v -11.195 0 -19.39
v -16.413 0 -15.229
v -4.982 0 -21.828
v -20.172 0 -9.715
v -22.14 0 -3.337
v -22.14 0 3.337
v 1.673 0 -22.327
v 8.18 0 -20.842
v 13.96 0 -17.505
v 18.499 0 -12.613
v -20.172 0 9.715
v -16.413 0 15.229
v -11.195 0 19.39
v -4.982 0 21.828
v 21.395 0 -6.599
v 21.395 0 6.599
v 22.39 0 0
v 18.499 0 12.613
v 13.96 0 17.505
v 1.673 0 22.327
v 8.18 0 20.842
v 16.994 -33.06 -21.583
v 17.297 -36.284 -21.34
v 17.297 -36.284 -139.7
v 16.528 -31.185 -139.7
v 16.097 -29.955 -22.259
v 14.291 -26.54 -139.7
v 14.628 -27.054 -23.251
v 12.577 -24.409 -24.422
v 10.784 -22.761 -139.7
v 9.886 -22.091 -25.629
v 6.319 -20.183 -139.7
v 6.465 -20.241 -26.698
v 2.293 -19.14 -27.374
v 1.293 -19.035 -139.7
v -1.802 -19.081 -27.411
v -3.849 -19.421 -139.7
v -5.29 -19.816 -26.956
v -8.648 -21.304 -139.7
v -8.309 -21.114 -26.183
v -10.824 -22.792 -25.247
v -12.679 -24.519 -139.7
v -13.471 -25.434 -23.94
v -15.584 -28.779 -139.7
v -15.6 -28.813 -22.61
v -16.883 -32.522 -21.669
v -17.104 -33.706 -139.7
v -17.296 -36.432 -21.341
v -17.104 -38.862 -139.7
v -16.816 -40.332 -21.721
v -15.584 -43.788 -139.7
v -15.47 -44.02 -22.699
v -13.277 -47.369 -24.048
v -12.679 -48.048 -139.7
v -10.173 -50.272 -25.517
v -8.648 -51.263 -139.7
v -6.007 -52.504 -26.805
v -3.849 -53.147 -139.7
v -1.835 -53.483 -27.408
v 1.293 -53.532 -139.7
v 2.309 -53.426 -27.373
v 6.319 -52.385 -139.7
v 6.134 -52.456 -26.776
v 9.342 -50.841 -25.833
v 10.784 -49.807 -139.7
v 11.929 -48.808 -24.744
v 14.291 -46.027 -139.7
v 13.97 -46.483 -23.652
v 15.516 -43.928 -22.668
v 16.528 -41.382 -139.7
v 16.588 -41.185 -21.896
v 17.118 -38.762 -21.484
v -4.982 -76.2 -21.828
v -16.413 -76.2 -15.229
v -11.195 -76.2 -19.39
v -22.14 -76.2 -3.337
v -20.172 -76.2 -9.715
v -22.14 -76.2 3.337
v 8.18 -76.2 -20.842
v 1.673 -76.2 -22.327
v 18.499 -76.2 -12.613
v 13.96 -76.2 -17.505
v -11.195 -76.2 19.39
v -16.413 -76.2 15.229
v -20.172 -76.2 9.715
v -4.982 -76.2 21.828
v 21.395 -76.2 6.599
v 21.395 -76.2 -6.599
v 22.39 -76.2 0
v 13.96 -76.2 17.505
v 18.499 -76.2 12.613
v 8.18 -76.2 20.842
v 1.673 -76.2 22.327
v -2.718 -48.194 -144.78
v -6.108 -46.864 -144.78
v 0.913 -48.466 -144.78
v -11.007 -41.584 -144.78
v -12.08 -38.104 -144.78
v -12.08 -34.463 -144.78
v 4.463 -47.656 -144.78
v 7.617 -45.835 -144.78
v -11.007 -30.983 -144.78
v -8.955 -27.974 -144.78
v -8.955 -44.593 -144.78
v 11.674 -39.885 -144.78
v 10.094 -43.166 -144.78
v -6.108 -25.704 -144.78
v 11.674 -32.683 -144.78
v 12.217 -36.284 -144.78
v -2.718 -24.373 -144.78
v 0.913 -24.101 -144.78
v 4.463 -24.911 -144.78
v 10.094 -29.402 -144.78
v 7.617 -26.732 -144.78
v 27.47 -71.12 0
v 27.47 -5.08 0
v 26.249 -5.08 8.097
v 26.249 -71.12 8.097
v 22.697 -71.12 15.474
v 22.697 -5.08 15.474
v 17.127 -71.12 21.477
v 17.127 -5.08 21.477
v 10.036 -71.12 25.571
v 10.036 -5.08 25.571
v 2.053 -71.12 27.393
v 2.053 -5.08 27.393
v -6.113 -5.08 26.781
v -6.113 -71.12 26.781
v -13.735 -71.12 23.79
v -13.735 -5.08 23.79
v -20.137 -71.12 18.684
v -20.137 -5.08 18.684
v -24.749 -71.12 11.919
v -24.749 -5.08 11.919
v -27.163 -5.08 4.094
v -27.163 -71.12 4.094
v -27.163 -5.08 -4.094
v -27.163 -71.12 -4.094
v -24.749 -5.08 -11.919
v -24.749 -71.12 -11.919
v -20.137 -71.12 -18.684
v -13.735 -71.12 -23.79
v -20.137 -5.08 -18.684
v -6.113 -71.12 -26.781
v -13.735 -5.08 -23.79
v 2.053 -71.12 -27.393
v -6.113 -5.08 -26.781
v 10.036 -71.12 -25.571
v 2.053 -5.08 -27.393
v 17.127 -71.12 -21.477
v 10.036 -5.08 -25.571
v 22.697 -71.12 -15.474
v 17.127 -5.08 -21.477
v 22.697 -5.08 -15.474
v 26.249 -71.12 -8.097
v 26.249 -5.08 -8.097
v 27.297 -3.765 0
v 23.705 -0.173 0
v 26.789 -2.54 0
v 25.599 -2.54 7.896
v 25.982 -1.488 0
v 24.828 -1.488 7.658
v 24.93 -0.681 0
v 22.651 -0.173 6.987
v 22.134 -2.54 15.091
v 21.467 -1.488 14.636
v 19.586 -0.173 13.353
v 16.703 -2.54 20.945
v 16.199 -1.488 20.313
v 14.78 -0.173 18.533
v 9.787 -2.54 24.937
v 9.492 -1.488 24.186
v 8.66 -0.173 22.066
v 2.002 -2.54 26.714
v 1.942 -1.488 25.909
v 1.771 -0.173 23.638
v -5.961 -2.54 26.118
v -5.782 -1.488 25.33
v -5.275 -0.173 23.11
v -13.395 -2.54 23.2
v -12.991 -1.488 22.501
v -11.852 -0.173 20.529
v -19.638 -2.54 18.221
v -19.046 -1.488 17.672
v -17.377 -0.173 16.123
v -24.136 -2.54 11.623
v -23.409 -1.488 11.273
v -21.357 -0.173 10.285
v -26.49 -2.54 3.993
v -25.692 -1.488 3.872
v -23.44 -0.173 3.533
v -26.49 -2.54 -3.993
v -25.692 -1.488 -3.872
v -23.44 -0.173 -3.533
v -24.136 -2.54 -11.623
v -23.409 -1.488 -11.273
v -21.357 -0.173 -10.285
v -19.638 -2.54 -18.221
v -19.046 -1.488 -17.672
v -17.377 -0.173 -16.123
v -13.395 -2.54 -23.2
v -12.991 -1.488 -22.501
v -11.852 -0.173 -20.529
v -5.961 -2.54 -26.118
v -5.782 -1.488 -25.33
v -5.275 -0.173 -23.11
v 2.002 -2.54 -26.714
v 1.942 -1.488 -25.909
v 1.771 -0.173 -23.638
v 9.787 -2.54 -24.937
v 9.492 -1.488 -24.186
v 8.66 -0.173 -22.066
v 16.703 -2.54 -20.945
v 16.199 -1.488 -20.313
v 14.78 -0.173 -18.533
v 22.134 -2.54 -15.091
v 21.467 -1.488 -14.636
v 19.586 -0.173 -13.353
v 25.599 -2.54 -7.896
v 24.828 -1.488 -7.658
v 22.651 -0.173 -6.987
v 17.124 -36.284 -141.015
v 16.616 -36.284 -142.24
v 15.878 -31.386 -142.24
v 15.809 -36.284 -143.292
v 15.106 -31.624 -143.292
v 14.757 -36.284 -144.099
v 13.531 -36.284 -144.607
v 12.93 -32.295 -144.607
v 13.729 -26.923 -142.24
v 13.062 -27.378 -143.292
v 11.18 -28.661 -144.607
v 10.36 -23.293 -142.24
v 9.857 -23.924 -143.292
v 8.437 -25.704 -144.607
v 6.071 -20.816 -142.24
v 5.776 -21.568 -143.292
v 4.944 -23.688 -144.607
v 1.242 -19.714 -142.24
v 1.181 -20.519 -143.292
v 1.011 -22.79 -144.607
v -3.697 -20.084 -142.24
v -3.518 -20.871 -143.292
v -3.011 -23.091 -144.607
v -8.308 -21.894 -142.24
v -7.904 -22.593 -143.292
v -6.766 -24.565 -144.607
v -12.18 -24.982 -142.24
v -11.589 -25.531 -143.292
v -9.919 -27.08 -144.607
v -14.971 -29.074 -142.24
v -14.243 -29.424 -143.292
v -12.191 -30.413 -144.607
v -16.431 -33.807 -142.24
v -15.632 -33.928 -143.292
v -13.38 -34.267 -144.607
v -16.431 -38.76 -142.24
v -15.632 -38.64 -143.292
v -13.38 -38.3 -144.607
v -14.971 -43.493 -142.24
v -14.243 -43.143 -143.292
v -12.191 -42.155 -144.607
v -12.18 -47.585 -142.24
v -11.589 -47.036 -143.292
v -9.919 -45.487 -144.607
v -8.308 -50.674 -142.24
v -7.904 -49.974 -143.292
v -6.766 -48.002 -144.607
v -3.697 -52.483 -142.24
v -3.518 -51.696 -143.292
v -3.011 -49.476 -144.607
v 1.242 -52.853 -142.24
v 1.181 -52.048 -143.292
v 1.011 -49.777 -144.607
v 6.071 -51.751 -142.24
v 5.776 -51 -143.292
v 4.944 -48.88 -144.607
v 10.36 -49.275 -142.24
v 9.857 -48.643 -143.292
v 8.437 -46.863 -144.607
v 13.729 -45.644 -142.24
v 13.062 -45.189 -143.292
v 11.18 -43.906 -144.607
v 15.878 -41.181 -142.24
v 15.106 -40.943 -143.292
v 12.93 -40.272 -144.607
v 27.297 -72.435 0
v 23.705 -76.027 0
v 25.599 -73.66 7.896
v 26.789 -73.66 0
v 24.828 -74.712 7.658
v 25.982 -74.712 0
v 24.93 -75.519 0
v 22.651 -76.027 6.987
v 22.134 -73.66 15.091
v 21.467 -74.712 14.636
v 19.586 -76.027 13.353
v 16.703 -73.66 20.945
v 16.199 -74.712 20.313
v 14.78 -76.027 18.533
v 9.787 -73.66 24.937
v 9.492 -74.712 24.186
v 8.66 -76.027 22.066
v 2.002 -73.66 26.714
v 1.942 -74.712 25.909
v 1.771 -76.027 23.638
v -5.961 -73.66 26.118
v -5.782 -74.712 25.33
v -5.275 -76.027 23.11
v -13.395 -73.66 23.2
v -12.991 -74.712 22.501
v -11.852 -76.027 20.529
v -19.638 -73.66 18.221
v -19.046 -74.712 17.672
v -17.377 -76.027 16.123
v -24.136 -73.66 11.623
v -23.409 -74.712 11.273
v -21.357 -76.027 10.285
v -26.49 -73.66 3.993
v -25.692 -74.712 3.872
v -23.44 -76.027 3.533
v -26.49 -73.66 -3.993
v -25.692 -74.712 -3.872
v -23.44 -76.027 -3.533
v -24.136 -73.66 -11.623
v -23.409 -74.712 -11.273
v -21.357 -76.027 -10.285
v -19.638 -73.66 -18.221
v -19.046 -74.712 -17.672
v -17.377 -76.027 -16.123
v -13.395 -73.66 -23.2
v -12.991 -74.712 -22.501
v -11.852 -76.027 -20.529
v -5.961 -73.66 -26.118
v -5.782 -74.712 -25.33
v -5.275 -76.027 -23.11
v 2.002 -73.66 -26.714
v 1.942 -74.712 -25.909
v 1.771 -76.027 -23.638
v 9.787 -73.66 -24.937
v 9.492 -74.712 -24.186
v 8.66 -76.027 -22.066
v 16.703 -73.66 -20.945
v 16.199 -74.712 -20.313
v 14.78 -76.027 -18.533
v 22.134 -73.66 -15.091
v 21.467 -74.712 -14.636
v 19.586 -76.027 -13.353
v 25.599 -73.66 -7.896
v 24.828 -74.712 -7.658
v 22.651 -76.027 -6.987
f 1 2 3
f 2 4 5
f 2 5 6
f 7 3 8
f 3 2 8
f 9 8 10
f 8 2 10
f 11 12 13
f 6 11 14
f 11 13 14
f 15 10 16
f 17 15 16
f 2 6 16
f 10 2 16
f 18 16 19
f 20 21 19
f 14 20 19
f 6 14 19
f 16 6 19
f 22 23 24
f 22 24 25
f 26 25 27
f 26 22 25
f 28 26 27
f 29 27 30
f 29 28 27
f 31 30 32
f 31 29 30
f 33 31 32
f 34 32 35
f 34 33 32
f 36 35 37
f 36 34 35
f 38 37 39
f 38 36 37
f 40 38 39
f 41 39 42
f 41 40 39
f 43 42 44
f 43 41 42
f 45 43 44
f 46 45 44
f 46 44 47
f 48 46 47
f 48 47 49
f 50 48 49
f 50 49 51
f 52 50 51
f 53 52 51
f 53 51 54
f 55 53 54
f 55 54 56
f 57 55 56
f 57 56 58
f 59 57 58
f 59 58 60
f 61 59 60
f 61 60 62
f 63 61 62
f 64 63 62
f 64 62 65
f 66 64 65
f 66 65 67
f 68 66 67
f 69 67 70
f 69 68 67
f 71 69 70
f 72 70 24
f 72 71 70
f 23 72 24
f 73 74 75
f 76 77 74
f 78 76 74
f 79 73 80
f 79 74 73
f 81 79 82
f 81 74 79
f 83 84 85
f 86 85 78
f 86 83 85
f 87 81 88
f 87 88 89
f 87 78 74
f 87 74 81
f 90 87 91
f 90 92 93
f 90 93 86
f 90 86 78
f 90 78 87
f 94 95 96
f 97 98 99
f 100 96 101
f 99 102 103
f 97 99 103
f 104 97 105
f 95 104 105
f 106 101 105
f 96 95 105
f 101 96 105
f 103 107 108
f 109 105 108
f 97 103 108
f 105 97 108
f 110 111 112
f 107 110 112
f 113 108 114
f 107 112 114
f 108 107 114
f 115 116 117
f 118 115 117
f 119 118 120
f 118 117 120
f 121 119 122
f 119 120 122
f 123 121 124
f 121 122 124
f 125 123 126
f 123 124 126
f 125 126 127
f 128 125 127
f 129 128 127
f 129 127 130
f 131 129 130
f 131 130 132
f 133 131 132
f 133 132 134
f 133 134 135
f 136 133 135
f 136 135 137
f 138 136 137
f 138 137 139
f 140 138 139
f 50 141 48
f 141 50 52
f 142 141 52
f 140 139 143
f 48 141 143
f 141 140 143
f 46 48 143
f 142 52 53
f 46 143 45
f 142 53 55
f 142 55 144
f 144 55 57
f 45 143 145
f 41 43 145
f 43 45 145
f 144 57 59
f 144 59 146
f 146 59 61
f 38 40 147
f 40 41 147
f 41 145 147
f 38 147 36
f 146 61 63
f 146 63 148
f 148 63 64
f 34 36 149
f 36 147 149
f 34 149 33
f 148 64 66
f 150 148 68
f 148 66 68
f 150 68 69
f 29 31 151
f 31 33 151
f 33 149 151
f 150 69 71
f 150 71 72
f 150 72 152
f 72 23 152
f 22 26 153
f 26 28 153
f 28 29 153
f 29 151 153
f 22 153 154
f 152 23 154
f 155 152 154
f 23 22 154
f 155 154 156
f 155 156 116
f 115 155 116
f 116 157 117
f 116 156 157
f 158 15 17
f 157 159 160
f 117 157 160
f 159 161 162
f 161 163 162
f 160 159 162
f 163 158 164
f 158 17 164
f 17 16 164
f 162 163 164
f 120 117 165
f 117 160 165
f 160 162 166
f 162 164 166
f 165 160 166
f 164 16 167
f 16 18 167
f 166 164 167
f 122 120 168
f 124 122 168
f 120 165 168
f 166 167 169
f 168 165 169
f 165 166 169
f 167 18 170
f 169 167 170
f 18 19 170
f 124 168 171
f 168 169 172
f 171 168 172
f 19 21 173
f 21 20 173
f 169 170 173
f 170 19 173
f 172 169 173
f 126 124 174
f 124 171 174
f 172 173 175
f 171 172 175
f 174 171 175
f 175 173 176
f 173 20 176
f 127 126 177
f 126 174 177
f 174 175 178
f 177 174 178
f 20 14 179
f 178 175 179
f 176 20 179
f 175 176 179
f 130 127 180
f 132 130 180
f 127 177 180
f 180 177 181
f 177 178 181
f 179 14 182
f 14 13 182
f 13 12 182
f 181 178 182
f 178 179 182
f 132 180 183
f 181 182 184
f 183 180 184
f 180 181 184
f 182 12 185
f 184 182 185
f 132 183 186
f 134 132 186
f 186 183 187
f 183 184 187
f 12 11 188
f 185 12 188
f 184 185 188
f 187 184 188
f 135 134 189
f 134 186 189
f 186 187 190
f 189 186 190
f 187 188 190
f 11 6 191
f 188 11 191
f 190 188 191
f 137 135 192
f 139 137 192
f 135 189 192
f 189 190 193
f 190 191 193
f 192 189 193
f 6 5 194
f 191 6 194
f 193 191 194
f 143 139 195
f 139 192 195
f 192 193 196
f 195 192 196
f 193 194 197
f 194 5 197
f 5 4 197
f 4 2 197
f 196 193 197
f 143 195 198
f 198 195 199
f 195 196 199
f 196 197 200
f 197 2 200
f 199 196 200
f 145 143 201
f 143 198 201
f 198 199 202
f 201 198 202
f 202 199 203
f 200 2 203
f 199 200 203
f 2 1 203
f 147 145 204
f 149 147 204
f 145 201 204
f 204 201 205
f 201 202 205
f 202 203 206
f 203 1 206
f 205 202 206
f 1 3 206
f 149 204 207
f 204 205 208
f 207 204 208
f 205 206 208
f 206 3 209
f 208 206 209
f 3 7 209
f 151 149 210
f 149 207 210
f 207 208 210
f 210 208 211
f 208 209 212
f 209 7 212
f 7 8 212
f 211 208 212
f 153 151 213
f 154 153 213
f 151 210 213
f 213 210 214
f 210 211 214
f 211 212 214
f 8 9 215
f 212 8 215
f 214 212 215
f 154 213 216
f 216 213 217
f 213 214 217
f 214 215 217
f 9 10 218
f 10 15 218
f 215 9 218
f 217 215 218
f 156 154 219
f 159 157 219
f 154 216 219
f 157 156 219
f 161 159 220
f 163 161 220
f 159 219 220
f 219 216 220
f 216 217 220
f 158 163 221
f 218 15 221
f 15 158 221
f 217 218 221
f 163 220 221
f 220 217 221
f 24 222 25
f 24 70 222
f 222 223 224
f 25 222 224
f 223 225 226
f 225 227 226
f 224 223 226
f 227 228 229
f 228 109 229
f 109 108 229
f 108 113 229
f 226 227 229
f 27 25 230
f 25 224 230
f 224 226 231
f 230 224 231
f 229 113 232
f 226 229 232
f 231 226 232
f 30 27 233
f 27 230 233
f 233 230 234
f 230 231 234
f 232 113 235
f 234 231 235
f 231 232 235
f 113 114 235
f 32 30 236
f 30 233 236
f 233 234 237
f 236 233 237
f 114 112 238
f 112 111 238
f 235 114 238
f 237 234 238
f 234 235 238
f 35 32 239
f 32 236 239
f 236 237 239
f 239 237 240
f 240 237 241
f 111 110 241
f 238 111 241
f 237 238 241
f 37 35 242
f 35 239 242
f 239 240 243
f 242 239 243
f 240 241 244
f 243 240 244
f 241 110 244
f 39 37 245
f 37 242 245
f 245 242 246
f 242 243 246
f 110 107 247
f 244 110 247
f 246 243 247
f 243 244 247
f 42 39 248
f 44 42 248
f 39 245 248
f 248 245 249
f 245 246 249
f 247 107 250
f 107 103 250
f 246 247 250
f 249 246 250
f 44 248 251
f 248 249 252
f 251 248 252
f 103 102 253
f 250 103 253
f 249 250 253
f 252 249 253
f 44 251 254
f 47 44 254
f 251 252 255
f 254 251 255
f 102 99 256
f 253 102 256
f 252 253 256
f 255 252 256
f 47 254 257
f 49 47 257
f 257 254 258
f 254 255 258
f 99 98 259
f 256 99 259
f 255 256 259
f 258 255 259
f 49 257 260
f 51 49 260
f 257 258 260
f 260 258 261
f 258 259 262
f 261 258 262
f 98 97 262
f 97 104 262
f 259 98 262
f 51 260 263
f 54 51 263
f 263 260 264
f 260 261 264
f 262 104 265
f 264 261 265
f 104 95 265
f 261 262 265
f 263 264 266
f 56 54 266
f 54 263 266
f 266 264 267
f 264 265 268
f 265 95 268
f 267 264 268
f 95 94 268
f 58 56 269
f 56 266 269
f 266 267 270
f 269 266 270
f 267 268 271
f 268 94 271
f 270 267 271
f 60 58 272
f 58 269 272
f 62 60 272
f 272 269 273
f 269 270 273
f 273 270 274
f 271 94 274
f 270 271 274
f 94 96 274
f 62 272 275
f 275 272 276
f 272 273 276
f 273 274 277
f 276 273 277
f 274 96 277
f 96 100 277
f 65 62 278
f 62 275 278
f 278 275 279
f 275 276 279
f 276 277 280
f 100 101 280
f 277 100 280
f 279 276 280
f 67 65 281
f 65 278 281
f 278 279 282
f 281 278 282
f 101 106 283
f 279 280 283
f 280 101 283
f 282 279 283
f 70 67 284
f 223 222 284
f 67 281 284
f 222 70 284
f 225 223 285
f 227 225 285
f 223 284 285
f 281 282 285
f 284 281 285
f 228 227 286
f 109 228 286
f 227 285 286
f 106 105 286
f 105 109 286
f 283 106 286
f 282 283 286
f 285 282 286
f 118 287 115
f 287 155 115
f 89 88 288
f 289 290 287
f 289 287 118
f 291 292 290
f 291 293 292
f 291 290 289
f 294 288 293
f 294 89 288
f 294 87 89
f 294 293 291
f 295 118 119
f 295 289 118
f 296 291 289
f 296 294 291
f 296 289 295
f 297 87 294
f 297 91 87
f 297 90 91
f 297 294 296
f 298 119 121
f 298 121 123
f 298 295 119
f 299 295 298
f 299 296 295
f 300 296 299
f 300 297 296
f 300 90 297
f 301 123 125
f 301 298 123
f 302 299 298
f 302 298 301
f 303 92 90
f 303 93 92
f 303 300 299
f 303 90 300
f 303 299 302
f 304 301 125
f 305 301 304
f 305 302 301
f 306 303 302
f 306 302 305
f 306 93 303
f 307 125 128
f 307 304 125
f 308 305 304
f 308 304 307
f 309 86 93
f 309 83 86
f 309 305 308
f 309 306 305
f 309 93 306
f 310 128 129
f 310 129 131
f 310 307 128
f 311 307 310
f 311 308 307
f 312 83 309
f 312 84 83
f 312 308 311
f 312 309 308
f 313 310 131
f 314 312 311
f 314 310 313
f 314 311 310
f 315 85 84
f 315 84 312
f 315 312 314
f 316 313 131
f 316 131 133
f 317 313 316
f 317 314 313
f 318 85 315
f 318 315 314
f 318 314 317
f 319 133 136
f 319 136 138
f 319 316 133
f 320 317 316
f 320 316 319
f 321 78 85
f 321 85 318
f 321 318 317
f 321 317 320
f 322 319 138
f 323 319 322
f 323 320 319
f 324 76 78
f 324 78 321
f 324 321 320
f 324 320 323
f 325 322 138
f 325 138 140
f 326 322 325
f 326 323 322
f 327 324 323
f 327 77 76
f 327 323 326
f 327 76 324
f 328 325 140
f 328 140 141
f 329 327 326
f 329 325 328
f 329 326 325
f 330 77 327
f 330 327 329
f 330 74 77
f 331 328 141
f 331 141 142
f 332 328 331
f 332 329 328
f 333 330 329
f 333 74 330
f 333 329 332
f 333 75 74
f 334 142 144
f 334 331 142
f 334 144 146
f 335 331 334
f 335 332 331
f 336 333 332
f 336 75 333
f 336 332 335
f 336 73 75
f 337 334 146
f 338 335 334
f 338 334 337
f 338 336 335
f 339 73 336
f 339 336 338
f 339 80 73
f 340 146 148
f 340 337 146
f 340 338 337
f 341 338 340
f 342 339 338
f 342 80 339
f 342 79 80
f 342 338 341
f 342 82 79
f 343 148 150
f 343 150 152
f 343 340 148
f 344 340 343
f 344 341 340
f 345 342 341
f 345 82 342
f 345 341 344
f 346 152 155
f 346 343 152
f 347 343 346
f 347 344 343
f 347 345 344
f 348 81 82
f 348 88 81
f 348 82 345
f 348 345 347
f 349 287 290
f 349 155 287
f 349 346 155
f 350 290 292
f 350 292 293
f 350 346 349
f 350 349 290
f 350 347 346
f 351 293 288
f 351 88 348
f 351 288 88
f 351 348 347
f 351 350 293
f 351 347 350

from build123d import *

# Parameters (mm, degrees)
F0_R     = 27.469765
F1_DEPTH = 76.2
F2_R     = 17.296695
F3_DEPTH = 144.78
F4_R     = 5.08
F5_R     = 5.08
F6_R     = 5.08


with BuildPart() as f1:
    # F0 (on Front) → F1 (new body)
    with BuildSketch(Plane.XZ):
        Circle(F0_R)
    extrude(amount=F1_DEPTH)

    # F2 (on Top) → F3 (join)
    with BuildSketch(Plane.XY):
        with Locations((0, -36.283679)):
            Circle(F2_R)
    extrude(amount=-F3_DEPTH)

    # F4
    f4_edges = [f1.edges().sort_by_distance(p)[0] for p in [
        (-17.296695, -36.283679, -144.78),
    ]]
    fillet(f4_edges, radius=F4_R)

    # F5
    f5_edges = [f1.edges().sort_by_distance(p)[0] for p in [
        (-27.469765, 0, 0),
    ]]
    fillet(f5_edges, radius=F5_R)

    # F6
    f6_edges = [f1.edges().sort_by_distance(p)[0] for p in [
        (-27.469765, -76.2, 0),
    ]]
    fillet(f6_edges, radius=F6_R)


solid = f1.part
